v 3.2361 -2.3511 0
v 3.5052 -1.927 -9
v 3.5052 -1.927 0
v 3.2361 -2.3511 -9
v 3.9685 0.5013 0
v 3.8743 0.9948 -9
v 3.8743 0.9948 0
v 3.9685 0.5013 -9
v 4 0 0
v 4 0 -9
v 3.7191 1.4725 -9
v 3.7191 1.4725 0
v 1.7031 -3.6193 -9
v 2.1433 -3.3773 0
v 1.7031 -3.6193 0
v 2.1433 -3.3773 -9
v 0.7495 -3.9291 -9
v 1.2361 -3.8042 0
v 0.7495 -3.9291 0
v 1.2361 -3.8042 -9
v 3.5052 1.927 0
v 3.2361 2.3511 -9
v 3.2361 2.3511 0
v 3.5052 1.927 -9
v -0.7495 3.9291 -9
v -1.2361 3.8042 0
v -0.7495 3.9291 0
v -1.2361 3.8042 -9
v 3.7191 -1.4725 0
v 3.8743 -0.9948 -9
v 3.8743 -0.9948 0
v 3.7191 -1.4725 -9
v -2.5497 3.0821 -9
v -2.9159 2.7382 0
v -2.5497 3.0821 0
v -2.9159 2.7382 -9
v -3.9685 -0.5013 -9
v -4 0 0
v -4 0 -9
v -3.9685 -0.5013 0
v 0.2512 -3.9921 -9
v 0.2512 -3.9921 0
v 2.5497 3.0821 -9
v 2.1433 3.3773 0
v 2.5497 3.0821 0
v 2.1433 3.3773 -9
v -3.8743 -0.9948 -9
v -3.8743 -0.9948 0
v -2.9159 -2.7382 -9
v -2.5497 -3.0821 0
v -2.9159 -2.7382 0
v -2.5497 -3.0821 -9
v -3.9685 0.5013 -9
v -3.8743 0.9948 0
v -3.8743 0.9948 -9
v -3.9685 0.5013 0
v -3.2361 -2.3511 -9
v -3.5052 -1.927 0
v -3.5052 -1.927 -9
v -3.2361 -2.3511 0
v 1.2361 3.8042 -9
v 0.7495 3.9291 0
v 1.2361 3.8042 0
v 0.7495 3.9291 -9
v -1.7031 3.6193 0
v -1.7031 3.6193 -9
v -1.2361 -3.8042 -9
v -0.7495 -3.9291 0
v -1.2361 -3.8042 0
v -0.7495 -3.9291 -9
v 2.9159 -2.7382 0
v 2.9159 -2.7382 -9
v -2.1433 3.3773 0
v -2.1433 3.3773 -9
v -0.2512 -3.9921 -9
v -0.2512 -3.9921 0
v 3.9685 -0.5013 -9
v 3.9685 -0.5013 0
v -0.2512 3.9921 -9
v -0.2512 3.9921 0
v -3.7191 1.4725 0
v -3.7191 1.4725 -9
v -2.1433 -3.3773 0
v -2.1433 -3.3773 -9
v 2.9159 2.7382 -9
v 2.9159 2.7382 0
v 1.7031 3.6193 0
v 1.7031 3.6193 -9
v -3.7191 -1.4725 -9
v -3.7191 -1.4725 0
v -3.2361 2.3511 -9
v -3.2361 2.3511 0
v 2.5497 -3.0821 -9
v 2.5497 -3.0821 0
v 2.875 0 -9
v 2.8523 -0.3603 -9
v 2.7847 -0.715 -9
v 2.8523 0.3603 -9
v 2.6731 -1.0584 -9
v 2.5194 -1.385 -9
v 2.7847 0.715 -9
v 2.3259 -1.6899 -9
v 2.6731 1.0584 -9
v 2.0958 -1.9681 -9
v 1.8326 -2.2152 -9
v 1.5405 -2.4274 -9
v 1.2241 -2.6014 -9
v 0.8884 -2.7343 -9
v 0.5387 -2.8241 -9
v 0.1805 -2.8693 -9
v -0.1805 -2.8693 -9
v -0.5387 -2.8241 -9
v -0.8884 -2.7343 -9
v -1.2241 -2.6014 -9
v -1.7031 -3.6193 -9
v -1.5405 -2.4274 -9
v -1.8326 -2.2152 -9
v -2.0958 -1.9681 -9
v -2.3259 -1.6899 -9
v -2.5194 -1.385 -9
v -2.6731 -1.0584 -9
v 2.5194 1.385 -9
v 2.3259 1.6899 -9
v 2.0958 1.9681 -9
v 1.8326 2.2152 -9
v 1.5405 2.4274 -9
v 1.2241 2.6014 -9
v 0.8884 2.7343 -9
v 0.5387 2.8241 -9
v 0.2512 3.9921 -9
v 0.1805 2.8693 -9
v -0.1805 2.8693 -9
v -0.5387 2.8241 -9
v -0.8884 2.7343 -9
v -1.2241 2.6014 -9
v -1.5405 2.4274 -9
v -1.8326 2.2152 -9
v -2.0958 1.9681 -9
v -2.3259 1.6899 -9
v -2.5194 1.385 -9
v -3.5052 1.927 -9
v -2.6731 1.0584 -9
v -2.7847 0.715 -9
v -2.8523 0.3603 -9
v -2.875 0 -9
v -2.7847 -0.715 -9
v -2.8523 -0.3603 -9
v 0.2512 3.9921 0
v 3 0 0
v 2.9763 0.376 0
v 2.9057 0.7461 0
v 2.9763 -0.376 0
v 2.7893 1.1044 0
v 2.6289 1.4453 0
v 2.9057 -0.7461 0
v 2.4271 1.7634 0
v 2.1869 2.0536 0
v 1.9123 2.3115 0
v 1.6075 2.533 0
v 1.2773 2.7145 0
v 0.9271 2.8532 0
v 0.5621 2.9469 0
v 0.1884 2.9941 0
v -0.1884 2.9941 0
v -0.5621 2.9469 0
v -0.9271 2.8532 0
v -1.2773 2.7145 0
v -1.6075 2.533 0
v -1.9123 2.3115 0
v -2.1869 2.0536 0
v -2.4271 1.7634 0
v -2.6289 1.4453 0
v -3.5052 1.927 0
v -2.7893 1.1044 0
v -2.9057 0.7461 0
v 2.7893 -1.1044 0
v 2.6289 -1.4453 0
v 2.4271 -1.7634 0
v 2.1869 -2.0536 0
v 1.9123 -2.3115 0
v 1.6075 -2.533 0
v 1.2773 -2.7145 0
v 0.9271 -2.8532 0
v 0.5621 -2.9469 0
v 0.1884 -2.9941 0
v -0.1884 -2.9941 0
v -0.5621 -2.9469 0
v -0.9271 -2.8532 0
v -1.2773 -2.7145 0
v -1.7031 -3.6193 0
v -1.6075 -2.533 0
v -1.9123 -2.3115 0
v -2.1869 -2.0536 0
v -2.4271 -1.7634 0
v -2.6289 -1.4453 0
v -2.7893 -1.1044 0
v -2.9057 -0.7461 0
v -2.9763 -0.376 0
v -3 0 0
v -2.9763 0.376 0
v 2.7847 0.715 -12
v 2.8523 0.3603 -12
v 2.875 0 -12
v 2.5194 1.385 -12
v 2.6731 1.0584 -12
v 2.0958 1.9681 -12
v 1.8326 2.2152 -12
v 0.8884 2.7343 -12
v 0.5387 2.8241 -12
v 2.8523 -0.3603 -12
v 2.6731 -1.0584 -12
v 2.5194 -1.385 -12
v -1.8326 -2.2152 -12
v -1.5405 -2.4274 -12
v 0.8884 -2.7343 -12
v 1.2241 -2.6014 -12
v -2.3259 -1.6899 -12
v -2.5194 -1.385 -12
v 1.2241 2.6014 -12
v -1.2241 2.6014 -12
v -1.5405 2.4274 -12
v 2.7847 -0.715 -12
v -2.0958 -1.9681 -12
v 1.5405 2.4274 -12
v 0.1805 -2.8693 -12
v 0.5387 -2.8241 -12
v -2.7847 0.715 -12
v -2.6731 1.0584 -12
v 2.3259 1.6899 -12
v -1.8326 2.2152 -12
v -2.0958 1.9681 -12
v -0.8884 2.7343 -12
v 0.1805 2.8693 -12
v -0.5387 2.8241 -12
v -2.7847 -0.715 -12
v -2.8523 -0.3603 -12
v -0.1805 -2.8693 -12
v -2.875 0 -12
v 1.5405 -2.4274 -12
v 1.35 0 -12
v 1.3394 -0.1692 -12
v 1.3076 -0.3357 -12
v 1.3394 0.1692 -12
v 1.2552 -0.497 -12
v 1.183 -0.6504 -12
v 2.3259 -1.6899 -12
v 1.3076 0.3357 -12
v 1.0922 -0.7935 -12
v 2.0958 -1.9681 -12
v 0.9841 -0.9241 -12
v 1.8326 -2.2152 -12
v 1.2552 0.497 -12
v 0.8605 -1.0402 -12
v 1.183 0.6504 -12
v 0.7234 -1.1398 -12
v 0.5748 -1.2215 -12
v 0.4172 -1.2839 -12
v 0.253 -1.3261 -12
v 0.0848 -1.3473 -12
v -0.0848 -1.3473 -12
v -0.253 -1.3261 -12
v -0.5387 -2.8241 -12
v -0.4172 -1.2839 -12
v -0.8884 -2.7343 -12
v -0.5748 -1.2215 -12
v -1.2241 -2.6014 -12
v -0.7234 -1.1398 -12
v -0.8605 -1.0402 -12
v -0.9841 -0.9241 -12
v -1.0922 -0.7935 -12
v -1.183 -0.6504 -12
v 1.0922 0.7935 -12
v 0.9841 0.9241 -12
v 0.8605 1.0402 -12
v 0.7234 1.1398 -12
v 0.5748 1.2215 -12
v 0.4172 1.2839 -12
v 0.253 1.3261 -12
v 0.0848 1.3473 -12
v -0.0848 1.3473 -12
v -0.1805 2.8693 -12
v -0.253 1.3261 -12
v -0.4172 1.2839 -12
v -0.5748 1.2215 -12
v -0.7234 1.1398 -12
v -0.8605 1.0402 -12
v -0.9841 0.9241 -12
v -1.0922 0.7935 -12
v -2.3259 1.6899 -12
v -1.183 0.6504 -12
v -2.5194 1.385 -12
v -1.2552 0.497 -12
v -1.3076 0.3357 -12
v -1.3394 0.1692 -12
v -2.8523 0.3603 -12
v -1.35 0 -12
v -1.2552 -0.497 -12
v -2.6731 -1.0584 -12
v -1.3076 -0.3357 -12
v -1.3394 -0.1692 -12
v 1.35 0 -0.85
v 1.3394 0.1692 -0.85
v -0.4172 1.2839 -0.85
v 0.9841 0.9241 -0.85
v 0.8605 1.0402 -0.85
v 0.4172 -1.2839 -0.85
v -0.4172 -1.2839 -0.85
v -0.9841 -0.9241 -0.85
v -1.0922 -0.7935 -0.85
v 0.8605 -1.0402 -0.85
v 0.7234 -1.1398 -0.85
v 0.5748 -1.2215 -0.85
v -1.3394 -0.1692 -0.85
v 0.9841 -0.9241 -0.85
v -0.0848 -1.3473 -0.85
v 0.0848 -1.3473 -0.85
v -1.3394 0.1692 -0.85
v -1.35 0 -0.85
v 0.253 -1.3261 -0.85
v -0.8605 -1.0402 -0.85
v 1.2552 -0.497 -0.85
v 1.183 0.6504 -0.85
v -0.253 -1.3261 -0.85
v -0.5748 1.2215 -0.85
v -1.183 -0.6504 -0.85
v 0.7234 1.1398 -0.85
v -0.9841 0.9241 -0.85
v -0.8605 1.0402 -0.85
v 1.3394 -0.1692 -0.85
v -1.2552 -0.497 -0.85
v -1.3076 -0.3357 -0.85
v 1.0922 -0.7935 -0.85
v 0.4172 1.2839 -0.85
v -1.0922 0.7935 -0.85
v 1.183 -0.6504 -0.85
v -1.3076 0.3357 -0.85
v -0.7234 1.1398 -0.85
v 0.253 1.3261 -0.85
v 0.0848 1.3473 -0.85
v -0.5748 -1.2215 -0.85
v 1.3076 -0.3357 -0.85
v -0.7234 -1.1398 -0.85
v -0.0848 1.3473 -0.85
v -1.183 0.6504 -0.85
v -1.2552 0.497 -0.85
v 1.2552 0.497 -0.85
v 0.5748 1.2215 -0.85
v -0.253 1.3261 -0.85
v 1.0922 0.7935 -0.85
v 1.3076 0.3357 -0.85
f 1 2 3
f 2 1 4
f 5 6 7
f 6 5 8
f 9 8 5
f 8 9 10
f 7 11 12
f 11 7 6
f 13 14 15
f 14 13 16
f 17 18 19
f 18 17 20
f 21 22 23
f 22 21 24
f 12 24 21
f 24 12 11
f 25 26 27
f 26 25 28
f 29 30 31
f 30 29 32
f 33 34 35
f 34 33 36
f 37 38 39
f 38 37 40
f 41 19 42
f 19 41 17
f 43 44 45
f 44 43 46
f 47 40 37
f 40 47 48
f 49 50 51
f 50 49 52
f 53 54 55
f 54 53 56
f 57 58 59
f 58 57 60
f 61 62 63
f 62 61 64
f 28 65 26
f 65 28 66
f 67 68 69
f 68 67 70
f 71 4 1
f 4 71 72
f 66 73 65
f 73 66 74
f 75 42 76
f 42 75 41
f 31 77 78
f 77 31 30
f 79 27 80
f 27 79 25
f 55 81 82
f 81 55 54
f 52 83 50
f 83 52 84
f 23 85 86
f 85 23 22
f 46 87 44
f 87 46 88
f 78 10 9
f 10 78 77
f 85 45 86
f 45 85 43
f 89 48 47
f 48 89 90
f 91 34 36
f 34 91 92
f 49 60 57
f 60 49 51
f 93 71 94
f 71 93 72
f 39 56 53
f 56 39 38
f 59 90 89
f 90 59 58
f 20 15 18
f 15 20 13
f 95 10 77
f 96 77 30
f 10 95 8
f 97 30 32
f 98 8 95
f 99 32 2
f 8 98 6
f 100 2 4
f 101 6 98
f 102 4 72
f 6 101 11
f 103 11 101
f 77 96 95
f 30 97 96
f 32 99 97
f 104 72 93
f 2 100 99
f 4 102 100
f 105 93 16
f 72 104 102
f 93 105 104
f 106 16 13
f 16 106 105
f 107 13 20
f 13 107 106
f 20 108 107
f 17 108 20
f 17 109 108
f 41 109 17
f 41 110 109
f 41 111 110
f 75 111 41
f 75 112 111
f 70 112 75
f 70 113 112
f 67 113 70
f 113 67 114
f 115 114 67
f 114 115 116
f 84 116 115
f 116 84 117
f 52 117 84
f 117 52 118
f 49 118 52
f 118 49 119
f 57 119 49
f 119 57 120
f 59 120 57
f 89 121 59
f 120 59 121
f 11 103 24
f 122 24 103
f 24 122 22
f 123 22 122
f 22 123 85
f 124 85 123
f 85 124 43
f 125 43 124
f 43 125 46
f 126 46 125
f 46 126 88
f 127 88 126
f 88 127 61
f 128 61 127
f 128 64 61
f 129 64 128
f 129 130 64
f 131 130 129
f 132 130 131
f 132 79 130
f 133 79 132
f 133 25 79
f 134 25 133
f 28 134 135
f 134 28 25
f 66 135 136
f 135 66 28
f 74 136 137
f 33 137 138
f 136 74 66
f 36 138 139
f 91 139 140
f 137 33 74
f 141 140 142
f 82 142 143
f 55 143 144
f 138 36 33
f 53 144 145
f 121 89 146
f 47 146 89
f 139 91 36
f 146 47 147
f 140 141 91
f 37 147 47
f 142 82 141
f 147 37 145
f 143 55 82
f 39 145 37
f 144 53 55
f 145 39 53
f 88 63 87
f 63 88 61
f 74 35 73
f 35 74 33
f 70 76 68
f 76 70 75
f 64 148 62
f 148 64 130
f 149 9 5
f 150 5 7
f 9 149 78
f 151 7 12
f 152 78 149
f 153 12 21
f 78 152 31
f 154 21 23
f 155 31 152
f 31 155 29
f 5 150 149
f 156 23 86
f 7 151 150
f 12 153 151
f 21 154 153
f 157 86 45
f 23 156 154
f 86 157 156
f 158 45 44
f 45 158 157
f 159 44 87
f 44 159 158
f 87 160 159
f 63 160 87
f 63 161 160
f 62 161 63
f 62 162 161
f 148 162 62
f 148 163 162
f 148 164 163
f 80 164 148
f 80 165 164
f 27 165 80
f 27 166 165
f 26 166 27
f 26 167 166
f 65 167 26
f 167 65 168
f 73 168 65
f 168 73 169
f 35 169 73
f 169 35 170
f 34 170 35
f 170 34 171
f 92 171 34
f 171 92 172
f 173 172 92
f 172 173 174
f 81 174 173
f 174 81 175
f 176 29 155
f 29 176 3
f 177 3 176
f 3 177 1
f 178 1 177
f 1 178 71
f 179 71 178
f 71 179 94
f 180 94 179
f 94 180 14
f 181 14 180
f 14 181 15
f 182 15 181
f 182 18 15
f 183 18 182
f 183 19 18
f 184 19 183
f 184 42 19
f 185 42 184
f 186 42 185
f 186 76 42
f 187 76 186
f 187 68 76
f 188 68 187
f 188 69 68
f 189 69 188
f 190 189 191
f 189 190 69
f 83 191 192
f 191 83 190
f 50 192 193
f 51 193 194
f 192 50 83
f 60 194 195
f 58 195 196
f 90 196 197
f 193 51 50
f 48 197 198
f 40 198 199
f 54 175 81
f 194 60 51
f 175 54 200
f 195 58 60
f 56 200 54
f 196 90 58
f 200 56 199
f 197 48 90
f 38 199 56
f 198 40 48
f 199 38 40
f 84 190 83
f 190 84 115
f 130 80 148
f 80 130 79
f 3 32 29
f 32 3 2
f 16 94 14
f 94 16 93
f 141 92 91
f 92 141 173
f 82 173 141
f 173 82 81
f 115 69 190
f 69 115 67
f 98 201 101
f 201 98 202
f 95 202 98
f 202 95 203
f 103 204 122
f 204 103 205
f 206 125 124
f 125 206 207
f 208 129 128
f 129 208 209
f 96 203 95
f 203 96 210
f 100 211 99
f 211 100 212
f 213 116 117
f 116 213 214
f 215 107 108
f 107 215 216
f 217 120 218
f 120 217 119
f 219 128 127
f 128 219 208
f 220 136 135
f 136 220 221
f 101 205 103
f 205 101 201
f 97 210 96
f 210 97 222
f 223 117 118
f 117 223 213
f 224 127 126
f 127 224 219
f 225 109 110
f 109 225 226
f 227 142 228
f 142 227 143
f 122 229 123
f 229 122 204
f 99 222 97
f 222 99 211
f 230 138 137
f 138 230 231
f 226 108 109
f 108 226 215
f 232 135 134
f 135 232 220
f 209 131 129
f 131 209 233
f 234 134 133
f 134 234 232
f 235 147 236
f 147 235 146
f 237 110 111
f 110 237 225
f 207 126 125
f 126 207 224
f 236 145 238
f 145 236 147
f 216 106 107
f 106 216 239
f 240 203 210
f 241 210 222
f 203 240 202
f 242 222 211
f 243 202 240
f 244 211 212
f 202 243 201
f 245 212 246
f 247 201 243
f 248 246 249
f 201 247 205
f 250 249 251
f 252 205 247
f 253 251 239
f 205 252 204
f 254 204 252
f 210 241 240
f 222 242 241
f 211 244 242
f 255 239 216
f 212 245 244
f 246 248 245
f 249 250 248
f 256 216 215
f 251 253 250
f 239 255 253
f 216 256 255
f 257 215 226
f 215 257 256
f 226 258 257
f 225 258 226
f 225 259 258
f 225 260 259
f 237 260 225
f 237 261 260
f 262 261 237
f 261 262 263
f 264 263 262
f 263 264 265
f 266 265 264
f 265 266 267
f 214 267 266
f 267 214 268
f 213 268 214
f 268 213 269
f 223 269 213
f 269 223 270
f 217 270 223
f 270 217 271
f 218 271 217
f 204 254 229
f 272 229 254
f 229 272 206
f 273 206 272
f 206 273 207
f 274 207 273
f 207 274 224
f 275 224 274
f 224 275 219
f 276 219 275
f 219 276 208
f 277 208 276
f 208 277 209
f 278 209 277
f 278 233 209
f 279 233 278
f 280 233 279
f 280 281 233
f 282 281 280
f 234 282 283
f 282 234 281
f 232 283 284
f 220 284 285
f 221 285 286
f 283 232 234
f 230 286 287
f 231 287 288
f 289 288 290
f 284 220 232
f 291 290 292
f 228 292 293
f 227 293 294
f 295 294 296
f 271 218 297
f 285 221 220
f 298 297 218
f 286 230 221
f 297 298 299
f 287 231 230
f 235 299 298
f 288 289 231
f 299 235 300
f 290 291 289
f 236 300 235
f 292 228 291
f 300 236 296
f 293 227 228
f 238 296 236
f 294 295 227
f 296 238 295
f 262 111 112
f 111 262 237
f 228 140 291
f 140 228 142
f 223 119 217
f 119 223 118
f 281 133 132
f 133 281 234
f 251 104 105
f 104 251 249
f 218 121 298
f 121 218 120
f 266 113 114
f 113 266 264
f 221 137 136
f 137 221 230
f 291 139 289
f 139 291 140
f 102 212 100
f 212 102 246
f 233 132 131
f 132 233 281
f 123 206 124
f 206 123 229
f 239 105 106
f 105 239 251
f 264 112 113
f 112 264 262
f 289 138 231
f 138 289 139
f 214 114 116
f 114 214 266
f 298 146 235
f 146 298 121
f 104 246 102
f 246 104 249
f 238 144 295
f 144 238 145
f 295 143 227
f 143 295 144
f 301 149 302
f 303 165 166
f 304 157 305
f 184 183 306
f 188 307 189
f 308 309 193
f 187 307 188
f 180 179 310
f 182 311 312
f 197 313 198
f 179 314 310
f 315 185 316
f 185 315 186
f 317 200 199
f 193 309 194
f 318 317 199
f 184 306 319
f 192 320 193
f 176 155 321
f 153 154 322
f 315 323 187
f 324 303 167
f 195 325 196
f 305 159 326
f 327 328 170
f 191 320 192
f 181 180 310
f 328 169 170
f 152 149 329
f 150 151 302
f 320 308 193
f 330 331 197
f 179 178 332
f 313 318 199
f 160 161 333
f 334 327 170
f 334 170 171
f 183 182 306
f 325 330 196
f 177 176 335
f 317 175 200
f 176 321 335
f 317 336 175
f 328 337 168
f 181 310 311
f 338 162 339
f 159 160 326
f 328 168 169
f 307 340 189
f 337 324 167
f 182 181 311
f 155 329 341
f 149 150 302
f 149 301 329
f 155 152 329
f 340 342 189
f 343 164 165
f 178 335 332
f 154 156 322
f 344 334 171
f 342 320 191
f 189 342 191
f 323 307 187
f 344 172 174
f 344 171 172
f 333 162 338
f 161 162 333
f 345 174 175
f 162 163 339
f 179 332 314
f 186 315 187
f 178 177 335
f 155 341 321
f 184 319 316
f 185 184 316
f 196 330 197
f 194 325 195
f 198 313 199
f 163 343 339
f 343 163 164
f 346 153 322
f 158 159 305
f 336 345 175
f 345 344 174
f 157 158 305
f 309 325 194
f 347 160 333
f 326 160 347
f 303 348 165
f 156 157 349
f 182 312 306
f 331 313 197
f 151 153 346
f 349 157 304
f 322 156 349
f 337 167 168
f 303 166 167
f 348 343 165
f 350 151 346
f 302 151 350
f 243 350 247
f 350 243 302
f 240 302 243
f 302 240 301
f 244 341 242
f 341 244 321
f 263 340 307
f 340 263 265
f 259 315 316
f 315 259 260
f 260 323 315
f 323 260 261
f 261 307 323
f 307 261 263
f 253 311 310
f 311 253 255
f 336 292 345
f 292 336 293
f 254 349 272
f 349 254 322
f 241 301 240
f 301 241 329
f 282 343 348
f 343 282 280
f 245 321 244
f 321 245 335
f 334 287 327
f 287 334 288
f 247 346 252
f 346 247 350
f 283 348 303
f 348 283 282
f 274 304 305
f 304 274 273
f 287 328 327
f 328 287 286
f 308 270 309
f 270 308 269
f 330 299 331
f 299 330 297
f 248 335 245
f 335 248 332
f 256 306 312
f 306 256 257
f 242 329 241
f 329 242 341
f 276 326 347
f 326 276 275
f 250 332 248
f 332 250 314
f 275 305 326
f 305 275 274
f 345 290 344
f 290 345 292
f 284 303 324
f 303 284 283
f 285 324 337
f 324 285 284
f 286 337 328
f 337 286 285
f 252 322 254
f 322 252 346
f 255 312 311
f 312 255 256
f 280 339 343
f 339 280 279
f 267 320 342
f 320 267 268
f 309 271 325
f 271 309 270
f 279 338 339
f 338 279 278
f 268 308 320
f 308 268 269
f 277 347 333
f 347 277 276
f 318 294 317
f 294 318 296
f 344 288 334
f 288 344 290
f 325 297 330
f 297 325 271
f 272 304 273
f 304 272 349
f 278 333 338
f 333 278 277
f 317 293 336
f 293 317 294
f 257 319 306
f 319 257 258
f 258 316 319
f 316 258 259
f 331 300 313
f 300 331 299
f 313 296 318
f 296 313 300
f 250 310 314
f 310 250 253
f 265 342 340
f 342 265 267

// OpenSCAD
$fn = 50;

difference() {
	union() {
		translate(v = [0, 0, -9.0]) {
			cylinder(h = 9, r = 4.0);
		}
		#translate(v = [0, 0, -12.0]) {
			cylinder(h = 12, r = 2.875);
		}
	}
	union() {
		translate(v = [0, 0, 0]) {
			rotate(a = [0, 0, 0]) {
				difference() {
					union() {
						translate(v = [0, 0, -12.0]) {
							cylinder(h = 12, r = 1.0);
						}
						translate(v = [0, 0, -0.85]) {
							cylinder(h = 0.85, r1 = 1.35, r2 = 3.0);
						}
						translate(v = [0, 0, -12.0]) {
							cylinder(h = 12, r = 1.35);
						}
						translate(v = [0, 0, -12.0]) {
							cylinder(h = 12, r = 1.0);
						}
					}
					union();
				}
			}
		}
	}
}
